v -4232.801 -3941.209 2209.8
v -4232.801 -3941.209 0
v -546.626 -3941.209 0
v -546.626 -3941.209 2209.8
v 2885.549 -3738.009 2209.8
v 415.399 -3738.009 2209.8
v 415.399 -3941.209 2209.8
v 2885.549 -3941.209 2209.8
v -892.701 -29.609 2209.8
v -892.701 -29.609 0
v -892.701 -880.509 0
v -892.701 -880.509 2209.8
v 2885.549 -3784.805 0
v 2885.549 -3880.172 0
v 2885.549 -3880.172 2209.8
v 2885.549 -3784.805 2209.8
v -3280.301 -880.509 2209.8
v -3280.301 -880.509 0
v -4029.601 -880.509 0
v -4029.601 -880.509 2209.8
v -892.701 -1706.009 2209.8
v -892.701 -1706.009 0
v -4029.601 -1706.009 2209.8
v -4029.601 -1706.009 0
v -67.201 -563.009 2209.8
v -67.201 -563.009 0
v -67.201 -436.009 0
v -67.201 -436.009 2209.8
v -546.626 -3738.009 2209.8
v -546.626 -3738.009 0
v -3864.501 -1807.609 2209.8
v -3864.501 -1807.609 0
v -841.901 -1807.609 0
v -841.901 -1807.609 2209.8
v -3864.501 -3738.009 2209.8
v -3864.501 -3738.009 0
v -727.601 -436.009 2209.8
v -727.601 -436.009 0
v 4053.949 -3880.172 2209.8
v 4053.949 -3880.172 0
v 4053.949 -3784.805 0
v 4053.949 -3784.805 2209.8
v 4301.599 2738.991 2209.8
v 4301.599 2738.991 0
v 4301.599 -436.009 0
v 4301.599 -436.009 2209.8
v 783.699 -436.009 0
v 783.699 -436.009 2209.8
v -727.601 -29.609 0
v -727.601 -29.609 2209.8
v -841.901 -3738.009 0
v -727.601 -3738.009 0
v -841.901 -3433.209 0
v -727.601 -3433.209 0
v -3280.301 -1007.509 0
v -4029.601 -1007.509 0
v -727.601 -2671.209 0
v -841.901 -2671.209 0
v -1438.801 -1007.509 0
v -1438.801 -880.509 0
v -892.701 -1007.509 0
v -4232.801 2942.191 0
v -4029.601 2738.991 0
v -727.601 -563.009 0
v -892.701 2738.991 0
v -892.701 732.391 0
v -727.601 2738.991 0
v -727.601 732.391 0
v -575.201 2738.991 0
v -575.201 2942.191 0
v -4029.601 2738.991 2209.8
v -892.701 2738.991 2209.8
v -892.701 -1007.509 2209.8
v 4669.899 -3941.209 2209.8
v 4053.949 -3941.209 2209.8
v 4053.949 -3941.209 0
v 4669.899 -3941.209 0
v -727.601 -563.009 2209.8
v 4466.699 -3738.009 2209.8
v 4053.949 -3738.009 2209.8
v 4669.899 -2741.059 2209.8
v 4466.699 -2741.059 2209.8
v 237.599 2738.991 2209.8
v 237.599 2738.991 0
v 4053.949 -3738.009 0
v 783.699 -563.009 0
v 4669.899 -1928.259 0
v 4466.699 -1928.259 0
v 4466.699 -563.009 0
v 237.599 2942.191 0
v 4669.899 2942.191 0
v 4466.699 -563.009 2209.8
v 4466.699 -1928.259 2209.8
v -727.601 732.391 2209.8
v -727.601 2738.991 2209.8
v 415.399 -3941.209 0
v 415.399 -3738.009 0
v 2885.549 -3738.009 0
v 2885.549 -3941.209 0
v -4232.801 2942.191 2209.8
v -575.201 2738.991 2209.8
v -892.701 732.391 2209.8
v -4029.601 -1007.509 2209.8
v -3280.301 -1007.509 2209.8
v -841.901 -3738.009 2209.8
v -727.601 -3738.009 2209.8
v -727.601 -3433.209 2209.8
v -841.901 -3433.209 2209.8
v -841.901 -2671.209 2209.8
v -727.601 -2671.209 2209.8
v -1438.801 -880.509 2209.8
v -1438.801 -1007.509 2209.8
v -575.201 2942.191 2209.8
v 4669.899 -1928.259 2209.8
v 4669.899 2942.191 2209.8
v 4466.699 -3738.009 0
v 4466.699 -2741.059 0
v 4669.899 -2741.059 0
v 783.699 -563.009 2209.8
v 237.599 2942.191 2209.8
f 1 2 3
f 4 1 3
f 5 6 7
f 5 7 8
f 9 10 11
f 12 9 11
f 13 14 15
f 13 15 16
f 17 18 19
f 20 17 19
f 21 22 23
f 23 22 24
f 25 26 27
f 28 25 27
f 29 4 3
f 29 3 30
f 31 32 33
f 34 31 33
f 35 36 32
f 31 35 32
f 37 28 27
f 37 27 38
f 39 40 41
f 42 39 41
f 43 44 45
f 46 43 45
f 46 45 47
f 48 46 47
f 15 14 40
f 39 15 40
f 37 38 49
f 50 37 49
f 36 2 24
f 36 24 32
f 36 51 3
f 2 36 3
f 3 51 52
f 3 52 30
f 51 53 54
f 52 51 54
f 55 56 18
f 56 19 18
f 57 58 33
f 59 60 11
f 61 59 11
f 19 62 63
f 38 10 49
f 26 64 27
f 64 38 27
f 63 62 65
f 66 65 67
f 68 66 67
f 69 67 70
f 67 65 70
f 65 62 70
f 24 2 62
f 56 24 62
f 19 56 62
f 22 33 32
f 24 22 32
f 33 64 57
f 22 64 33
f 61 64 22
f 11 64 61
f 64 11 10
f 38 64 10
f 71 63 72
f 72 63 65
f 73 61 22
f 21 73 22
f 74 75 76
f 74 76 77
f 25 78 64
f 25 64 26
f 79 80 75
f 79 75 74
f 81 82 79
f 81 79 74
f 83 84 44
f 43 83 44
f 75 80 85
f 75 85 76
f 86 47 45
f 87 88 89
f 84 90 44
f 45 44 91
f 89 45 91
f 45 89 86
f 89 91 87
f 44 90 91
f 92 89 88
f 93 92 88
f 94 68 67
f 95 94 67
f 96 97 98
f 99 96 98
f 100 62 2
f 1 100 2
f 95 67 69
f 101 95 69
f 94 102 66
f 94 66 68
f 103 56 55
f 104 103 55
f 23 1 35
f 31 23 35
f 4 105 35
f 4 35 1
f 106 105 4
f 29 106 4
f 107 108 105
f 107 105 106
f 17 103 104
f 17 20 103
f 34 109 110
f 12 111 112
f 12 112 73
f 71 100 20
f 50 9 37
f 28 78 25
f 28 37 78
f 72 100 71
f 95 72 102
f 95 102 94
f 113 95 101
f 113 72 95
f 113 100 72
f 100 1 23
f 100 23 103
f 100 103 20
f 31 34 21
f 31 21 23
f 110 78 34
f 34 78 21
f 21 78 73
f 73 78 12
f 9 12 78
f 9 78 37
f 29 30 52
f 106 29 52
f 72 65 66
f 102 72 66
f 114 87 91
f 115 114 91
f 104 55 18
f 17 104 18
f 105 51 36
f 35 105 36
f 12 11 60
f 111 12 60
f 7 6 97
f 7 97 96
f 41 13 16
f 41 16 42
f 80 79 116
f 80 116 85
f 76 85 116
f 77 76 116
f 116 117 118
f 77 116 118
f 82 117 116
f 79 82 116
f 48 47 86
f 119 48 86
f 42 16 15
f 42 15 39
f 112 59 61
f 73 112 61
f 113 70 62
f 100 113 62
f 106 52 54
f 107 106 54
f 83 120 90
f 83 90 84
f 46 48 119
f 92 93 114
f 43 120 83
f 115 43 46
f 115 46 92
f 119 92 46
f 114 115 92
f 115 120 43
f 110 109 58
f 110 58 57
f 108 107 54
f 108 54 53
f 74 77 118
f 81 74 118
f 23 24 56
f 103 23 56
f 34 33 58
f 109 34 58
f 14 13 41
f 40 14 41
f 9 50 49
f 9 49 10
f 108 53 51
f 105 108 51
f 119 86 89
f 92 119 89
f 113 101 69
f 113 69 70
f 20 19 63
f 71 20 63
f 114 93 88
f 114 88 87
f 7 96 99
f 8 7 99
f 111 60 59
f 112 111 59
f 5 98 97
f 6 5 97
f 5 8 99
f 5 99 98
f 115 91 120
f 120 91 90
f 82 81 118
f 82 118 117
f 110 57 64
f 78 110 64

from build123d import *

# Parameters (mm, degrees)
F1_DEPTH = 2209.8
F0_W     = 1168.4
F0_H     = 95.366954
F2_DEPTH = 2209.8


with BuildPart() as f1:
    # F0 (on Top) → F1 (new body)
    with BuildSketch(Plane.XY):
        Polygon((-727.601136, 732.391245), (-727.601136, 2738.991245), (-575.201136, 2738.991245), (-575.201136, 2942.191245), (-4232.801136, 2942.191245), (-4232.801136, -3941.208755), (-546.626136, -3941.208755), (-546.626136, -3738.008755), (-727.601136, -3738.008755), (-727.601136, -3433.208755), (-841.901136, -3433.208755), (-841.901136, -3738.008755), (-3864.501136, -3738.008755), (-3864.501136, -1807.608755), (-841.901136, -1807.608755), (-841.901136, -2671.208755), (-727.601136, -2671.208755), (-727.601136, -563.008755), (-67.201136, -563.008755), (-67.201136, -436.008755), (-727.601136, -436.008755), (-727.601136, -29.608755), (-892.701136, -29.608755), (-892.701136, -880.508755), (-1438.801136, -880.508755), (-1438.801136, -1007.508755), (-892.701136, -1007.508755), (-892.701136, -1706.008755), (-4029.601136, -1706.008755), (-4029.601136, -1007.508755), (-3280.301136, -1007.508755), (-3280.301136, -880.508755), (-4029.601136, -880.508755), (-4029.601136, 2738.991245), (-892.701136, 2738.991245), (-892.701136, 732.391245), align=None)
        Polygon((2885.548864, -3738.008755), (415.398864, -3738.008755), (415.398864, -3941.208755), (2885.548864, -3941.208755), (2885.548864, -3880.171537), (2885.548864, -3784.804583), align=None)
        Polygon((4053.948864, -3738.008755), (4053.948864, -3784.804583), (4053.948864, -3880.171537), (4053.948864, -3941.208755), (4669.898864, -3941.208755), (4669.898864, -2741.058755), (4466.698864, -2741.058755), (4466.698864, -3738.008755), align=None)
        Polygon((237.598864, 2738.991245), (4301.598864, 2738.991245), (4301.598864, -436.008755), (783.698864, -436.008755), (783.698864, -563.008755), (4466.698864, -563.008755), (4466.698864, -1928.258755), (4669.898864, -1928.258755), (4669.898864, 2942.191245), (237.598864, 2942.191245), align=None)
    extrude(amount=F1_DEPTH)


with BuildPart() as f2:
    # F0 (on Top) → F2 (new body, through all)
    with BuildSketch(Plane.XY):
        with Locations((3469.748864, -3832.48806)):
            Rectangle(F0_W, F0_H)
    extrude(amount=F2_DEPTH)


solid = Compound([f1.part, f2.part])
